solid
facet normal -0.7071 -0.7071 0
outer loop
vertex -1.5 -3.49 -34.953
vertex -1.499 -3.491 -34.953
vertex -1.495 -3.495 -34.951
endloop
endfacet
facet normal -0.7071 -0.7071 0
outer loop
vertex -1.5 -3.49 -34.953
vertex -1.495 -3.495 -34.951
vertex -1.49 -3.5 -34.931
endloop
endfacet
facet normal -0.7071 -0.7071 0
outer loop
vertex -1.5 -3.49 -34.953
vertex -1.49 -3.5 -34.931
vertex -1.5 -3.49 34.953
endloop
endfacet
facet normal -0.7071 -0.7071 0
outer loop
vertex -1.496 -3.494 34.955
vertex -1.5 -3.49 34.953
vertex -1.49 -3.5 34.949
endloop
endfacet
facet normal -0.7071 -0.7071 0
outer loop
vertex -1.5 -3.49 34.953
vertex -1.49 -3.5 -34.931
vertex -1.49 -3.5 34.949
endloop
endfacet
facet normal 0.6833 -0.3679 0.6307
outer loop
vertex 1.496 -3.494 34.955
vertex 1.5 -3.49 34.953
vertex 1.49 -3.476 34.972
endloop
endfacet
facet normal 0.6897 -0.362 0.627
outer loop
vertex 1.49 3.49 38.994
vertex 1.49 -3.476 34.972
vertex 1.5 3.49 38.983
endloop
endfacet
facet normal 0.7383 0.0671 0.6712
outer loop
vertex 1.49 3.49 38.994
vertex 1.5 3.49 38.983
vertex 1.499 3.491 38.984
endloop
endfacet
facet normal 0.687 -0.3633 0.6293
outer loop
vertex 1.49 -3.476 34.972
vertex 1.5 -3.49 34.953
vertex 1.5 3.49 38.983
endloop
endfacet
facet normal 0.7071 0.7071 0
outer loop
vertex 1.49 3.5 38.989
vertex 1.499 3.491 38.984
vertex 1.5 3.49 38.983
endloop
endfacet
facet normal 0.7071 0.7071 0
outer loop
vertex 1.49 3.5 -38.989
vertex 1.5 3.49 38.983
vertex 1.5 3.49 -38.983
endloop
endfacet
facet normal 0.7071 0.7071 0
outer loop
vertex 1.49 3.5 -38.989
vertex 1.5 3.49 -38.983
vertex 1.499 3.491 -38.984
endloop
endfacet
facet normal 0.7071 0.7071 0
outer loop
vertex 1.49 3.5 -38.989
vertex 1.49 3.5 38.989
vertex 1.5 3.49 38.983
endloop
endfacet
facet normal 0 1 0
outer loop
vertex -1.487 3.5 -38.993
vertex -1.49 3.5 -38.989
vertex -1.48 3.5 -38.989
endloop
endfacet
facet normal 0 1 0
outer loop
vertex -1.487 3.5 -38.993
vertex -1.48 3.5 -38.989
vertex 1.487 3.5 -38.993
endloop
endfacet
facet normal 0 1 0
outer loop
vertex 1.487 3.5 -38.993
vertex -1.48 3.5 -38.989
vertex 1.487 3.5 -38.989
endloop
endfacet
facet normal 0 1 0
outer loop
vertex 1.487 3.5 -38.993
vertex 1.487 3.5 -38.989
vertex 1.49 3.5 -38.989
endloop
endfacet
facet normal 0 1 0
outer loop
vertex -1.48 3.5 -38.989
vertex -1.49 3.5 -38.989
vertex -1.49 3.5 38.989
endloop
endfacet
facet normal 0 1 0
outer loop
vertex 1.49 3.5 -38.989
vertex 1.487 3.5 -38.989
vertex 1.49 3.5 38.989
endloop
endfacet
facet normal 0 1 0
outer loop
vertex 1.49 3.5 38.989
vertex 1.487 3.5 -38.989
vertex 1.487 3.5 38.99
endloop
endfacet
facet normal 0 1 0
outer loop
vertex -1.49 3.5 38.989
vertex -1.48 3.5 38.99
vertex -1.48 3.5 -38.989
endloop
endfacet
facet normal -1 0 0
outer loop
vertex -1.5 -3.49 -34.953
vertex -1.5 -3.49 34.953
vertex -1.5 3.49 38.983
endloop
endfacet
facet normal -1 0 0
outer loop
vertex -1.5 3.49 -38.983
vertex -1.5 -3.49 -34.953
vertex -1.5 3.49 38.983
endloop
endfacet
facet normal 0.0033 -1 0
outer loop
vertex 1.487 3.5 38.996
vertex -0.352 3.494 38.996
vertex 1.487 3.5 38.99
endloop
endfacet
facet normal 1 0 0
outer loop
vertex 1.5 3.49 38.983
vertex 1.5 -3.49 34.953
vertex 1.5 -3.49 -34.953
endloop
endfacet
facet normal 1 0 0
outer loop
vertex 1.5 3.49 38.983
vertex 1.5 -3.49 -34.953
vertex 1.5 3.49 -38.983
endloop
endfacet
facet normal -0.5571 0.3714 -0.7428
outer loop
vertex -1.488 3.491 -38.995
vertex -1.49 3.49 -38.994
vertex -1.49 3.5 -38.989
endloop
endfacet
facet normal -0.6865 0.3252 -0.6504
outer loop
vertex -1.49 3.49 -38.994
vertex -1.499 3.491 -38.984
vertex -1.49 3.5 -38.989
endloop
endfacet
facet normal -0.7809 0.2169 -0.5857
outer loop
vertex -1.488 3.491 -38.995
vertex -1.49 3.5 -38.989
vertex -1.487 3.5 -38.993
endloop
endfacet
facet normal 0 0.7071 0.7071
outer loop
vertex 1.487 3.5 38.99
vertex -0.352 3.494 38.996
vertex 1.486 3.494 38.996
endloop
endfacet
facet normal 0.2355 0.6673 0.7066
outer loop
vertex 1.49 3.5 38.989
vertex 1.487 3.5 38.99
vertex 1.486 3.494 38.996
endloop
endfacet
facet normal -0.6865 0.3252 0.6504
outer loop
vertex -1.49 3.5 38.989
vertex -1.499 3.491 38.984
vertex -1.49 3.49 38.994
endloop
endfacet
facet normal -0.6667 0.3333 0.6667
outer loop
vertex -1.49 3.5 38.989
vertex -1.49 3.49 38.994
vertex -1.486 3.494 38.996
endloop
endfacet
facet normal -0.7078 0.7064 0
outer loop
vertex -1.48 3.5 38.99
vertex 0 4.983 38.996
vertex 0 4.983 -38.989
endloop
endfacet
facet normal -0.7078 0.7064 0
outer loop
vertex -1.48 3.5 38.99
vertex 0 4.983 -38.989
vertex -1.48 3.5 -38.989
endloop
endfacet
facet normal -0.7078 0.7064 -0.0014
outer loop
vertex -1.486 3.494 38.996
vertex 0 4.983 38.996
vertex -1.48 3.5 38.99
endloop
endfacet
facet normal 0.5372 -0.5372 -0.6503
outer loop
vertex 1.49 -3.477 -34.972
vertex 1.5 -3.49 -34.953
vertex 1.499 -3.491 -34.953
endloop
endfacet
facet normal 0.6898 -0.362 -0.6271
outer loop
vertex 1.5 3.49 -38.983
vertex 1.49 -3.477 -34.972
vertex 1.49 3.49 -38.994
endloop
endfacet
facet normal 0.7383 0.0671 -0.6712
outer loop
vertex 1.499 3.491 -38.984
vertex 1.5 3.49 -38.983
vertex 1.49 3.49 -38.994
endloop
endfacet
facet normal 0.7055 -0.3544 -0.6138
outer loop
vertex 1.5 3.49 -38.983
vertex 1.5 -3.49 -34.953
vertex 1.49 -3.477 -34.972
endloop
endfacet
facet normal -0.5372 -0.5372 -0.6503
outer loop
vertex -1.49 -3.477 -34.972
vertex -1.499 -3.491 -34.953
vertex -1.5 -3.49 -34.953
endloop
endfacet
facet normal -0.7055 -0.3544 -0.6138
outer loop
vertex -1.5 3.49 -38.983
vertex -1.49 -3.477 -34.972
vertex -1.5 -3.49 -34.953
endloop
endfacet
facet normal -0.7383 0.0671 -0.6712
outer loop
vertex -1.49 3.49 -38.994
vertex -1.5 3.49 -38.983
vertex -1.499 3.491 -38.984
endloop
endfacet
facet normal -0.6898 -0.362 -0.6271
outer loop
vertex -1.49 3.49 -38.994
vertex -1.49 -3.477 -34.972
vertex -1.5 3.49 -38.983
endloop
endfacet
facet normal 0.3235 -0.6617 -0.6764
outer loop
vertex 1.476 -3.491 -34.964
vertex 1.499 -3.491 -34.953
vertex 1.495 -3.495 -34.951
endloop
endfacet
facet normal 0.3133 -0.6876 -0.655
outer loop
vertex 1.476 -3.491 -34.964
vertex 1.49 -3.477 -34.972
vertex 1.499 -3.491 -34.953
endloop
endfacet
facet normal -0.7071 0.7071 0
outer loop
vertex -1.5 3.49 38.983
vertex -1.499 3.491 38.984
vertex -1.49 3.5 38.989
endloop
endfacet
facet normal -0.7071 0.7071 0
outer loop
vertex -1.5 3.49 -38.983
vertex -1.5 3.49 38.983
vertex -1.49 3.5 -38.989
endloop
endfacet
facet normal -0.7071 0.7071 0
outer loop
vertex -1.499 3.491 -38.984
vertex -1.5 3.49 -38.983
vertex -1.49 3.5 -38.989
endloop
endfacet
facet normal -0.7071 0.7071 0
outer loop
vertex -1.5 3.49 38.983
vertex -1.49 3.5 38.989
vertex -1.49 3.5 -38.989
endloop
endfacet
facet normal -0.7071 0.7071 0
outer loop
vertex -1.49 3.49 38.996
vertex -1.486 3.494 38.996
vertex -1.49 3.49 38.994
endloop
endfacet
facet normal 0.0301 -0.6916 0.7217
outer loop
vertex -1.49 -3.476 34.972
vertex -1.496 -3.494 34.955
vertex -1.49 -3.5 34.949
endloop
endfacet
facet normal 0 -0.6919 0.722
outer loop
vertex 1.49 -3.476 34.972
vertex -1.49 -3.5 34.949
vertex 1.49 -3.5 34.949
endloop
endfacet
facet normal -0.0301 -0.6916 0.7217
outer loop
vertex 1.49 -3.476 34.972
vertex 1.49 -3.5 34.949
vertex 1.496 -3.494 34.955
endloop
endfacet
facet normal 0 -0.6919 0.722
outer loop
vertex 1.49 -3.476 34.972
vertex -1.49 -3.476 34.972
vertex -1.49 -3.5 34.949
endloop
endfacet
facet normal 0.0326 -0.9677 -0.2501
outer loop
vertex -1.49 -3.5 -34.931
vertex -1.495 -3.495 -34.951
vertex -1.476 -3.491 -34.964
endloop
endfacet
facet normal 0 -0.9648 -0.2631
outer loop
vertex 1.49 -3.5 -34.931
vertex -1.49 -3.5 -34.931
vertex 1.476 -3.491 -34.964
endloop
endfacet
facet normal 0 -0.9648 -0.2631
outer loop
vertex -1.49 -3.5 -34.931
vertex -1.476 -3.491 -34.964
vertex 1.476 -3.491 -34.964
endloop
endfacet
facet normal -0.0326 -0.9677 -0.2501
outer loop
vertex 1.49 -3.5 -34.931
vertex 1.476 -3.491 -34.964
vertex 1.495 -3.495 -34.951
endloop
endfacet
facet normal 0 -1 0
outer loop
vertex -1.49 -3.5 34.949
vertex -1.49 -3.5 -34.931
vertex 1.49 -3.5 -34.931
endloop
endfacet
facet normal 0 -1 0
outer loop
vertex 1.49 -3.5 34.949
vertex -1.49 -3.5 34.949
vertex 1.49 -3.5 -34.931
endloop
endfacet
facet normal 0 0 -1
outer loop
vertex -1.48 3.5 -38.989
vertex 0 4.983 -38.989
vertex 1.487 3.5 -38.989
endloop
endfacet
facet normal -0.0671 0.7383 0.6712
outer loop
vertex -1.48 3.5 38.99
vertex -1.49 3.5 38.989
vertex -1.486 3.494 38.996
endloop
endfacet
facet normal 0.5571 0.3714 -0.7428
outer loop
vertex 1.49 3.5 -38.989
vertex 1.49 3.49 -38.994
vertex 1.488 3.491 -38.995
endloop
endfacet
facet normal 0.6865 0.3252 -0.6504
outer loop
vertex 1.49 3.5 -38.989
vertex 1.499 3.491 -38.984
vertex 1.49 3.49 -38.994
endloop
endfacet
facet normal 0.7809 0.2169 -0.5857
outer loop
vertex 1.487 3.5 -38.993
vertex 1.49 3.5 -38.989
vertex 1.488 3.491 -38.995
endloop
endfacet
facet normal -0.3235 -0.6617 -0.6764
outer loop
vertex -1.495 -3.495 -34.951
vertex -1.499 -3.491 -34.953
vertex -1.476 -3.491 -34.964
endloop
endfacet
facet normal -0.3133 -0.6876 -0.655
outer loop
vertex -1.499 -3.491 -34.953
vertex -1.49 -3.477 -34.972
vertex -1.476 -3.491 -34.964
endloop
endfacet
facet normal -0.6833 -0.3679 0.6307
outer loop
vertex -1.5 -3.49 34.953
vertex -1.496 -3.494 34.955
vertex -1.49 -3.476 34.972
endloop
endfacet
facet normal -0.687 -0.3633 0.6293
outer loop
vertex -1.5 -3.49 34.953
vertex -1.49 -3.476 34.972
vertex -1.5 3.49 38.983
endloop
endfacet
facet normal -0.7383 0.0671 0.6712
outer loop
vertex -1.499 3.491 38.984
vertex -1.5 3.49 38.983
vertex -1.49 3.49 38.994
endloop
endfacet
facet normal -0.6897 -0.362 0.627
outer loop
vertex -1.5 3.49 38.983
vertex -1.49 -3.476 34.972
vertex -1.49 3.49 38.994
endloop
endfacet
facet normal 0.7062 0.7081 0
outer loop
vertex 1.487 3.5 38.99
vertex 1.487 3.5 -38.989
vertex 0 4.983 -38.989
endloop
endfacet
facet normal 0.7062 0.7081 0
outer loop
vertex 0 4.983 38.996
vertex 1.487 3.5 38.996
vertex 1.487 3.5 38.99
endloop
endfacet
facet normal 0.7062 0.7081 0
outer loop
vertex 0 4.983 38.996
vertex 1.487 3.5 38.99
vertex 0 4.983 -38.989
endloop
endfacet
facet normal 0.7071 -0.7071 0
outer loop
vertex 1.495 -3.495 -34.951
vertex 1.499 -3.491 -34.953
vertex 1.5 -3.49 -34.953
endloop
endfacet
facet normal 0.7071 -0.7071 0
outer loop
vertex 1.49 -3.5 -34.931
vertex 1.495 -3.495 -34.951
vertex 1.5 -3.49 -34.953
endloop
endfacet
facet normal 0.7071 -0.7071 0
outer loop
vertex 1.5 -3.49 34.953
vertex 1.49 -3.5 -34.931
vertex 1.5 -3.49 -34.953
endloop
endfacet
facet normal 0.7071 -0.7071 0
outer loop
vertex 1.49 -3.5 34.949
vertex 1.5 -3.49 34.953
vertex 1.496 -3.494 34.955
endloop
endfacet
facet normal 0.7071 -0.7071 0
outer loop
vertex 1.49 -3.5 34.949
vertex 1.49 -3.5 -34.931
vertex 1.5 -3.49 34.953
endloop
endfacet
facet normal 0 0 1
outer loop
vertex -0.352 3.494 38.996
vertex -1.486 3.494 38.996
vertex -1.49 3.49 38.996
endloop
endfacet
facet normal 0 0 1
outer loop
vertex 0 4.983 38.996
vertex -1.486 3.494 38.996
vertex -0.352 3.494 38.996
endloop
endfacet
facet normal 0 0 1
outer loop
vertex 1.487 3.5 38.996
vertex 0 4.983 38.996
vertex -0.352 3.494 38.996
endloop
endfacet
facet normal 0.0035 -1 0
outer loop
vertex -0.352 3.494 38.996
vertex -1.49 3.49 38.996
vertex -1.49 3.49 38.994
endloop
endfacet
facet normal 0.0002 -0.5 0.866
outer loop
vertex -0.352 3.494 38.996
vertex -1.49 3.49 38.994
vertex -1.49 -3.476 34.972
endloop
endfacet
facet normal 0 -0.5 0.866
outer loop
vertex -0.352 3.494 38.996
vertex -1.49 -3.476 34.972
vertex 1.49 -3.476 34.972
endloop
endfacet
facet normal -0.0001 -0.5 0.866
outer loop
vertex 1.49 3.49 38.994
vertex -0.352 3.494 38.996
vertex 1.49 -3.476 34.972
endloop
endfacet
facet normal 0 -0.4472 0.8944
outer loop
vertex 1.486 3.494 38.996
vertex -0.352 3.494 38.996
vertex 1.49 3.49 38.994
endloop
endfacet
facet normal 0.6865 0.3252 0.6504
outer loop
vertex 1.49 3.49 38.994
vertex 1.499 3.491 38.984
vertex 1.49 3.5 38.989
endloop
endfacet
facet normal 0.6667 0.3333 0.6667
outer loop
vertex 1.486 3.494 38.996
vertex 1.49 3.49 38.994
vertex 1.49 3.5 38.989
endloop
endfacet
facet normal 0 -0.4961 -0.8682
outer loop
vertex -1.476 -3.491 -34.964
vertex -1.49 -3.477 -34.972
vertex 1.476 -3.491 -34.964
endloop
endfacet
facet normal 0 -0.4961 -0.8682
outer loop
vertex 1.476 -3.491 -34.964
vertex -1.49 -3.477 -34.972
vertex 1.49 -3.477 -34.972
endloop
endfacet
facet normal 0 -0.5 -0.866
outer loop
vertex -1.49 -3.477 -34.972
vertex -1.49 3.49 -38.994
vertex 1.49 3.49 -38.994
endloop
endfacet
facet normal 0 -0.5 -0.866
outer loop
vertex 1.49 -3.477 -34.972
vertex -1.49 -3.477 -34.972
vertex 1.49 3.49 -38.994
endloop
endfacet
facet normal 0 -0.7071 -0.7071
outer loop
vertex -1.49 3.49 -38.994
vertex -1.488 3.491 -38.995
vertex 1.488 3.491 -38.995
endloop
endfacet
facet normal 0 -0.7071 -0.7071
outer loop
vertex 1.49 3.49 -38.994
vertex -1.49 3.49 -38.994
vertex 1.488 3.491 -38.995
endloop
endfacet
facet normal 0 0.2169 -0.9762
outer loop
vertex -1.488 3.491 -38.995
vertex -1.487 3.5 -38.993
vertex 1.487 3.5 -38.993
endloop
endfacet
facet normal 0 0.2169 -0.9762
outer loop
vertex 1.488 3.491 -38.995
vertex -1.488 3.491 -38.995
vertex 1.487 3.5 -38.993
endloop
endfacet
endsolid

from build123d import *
from OCP.BRepFilletAPI import BRepFilletAPI_MakeChamfer

# Parameters (mm, degrees)
SKETCH1_W           = 3
SKETCH1_H           = 7
BOSS_EXTRUDE1_DEPTH = 39
DRAFT1_ANGLE        = -30
DRAFT2_ANGLE        = -30
CHAMFER1_SIZE       = 0.01
CHAMFER2_SIZE       = 0.01
CHAMFER2_SIZE_2     = 0.007320508
CHAMFER2_SIZE_3     = 0.027320508
CHAMFER2_SIZE_4     = 0.007758146
CHAMFER2_SIZE_5     = 0.017186236
BOSS_EXTRUDE2_START = 38.99634
BOSS_EXTRUDE2_DEPTH = 77.98554


with BuildPart() as part:
    # Sketch1 → Boss-Extrude1 (new, symmetric)
    with BuildSketch(Plane.XY):
        Rectangle(SKETCH1_W, SKETCH1_H)
    extrude(amount=BOSS_EXTRUDE1_DEPTH, both=True)

    # Draft1
    draft1_faces = [part.faces().sort_by_distance(p)[0] for p in [
        (0, 0, 39),
    ]]
    draft(draft1_faces, Plane(origin=(1.5, 3.5, 39), x_dir=(1, 0, 0), z_dir=(0, 1, 0)), DRAFT1_ANGLE)

    # Draft2
    draft2_faces = [part.faces().sort_by_distance(p)[0] for p in [
        (0, 0, -39),
    ]]
    draft(draft2_faces, Plane(origin=(1.5, 3.5, 39), x_dir=(1, 0, 0), z_dir=(0, 1, 0)), DRAFT2_ANGLE)

    # Chamfer1
    chamfer1_edges = [part.edges().sort_by_distance(p)[0] for p in [
        (-1.5, 3.5, 0),
        (1.5, 3.5, 0),
        (1.5, -3.5, 0),
        (-1.5, -3.5, 0),
    ]]
    chamfer(chamfer1_edges, length=CHAMFER1_SIZE)

    # Chamfer2
    chamfer2_edges_1 = [part.edges().sort_by_distance(p)[0] for p in [
        (0, 3.5, -39),
    ]]
    chamfer2_side_1 = [part.faces().sort_by_distance(p)[0] for p in [
        (0, 3.499873205, -38.999926795),
    ]]
    chamfer2_edges_2 = [part.edges().sort_by_distance(p)[0] for p in [
        (0, -3.5, -34.958548116),
    ]]
    chamfer2_side_2 = [part.faces().sort_by_distance(p)[0] for p in [
        (0, -3.5, -34.958348116),
    ]]
    chamfer2_edges_3 = [part.edges().sort_by_distance(p)[0] for p in [
        (1.495, 3.495, -38.997113249),
    ]]
    chamfer2_side_3 = [part.faces().sort_by_distance(p)[0] for p in [
        (1.494882708, 3.494912031, -38.99706246),
    ]]
    chamfer2_edges_4 = [part.edges().sort_by_distance(p)[0] for p in [
        (1.495, 3.495, 38.997113249),
    ]]
    chamfer2_side_4 = [part.faces().sort_by_distance(p)[0] for p in [
        (1.494882708, 3.494912031, 38.99706246),
    ]]
    chamfer2_edges_5 = [part.edges().sort_by_distance(p)[0] for p in [
        (-1.495, 3.495, -38.997113249),
    ]]
    chamfer2_side_5 = [part.faces().sort_by_distance(p)[0] for p in [
        (-1.494882708, 3.494912031, -38.99706246),
    ]]
    chamfer2_edges_6 = [part.edges().sort_by_distance(p)[0] for p in [
        (-1.495, 3.495, 38.997113249),
    ]]
    chamfer2_side_6 = [part.faces().sort_by_distance(p)[0] for p in [
        (-1.494882708, 3.494912031, 38.99706246),
    ]]
    chamfer2_edges_7 = [part.edges().sort_by_distance(p)[0] for p in [
        (0, 3.5, 39),
    ]]
    chamfer2_side_7 = [part.faces().sort_by_distance(p)[0] for p in [
        (0, 3.499873205, 38.999926795),
    ]]
    chamfer2_edges_8 = [part.edges().sort_by_distance(p)[0] for p in [
        (0, -3.5, 34.958548116),
    ]]
    chamfer2_side_8 = [part.faces().sort_by_distance(p)[0] for p in [
        (0, -3.5, 34.958348116),
    ]]
    chamfer2 = BRepFilletAPI_MakeChamfer(part.part.solid().wrapped)
    for e in chamfer2_edges_1:
        chamfer2.Add(CHAMFER2_SIZE, CHAMFER2_SIZE_2, e.wrapped, chamfer2_side_1[0].wrapped)
    for e in chamfer2_edges_2:
        chamfer2.Add(CHAMFER2_SIZE_3, CHAMFER2_SIZE, e.wrapped, chamfer2_side_2[0].wrapped)
    for e in chamfer2_edges_3:
        chamfer2.Add(CHAMFER2_SIZE_4, CHAMFER2_SIZE, e.wrapped, chamfer2_side_3[0].wrapped)
    for e in chamfer2_edges_4:
        chamfer2.Add(CHAMFER2_SIZE_4, CHAMFER2_SIZE, e.wrapped, chamfer2_side_4[0].wrapped)
    for e in chamfer2_edges_5:
        chamfer2.Add(CHAMFER2_SIZE_4, CHAMFER2_SIZE, e.wrapped, chamfer2_side_5[0].wrapped)
    for e in chamfer2_edges_6:
        chamfer2.Add(CHAMFER2_SIZE_4, CHAMFER2_SIZE, e.wrapped, chamfer2_side_6[0].wrapped)
    for e in chamfer2_edges_7:
        chamfer2.Add(CHAMFER2_SIZE_2, CHAMFER2_SIZE, e.wrapped, chamfer2_side_7[0].wrapped)
    for e in chamfer2_edges_8:
        chamfer2.Add(CHAMFER2_SIZE, CHAMFER2_SIZE_3, e.wrapped, chamfer2_side_8[0].wrapped)
    add(Compound.cast(chamfer2.Shape()), mode=Mode.REPLACE)
    chamfer2_2_edges_1 = [part.edges().sort_by_distance(p)[0] for p in [
        (1.499330127, -3.490669873, -34.963934867),
    ]]
    chamfer2_2_side_1 = [part.faces().sort_by_distance(p)[0] for p in [
        (1.499383579, -3.490616421, -34.963749703),
    ]]
    chamfer2_2_edges_2 = [part.edges().sort_by_distance(p)[0] for p in [
        (-1.499330127, -3.490669873, -34.963934867),
    ]]
    chamfer2_2_side_2 = [part.faces().sort_by_distance(p)[0] for p in [
        (-1.499383579, -3.490616421, -34.963749703),
    ]]
    chamfer2_2 = BRepFilletAPI_MakeChamfer(part.part.solid().wrapped)
    for e in chamfer2_2_edges_1:
        chamfer2_2.Add(CHAMFER2_SIZE, CHAMFER2_SIZE_5, e.wrapped, chamfer2_2_side_1[0].wrapped)
    for e in chamfer2_2_edges_2:
        chamfer2_2.Add(CHAMFER2_SIZE, CHAMFER2_SIZE_5, e.wrapped, chamfer2_2_side_2[0].wrapped)
    add(Compound.cast(chamfer2_2.Shape()), mode=Mode.REPLACE)
    chamfer2_3_edges = [part.edges().sort_by_distance(p)[0] for p in [
        (-1.5, 0.006236096, -36.982874469),
        (-1.5, 0.001698596, 36.980254743),
        (1.5, 0.006236096, -36.982874469),
        (1.5, 0.001698596, 36.980254743),
    ]]
    chamfer(chamfer2_3_edges, length=CHAMFER2_SIZE)

    # Sketch2 → Boss-Extrude2 (add)
    with BuildSketch(Plane.XY.offset(BOSS_EXTRUDE2_START)):
        Polygon((1.486692701, 3.5), (0, 4.983222747), (-1.49, 3.489736937), align=None)
    extrude(amount=-BOSS_EXTRUDE2_DEPTH)


solid = part.part
